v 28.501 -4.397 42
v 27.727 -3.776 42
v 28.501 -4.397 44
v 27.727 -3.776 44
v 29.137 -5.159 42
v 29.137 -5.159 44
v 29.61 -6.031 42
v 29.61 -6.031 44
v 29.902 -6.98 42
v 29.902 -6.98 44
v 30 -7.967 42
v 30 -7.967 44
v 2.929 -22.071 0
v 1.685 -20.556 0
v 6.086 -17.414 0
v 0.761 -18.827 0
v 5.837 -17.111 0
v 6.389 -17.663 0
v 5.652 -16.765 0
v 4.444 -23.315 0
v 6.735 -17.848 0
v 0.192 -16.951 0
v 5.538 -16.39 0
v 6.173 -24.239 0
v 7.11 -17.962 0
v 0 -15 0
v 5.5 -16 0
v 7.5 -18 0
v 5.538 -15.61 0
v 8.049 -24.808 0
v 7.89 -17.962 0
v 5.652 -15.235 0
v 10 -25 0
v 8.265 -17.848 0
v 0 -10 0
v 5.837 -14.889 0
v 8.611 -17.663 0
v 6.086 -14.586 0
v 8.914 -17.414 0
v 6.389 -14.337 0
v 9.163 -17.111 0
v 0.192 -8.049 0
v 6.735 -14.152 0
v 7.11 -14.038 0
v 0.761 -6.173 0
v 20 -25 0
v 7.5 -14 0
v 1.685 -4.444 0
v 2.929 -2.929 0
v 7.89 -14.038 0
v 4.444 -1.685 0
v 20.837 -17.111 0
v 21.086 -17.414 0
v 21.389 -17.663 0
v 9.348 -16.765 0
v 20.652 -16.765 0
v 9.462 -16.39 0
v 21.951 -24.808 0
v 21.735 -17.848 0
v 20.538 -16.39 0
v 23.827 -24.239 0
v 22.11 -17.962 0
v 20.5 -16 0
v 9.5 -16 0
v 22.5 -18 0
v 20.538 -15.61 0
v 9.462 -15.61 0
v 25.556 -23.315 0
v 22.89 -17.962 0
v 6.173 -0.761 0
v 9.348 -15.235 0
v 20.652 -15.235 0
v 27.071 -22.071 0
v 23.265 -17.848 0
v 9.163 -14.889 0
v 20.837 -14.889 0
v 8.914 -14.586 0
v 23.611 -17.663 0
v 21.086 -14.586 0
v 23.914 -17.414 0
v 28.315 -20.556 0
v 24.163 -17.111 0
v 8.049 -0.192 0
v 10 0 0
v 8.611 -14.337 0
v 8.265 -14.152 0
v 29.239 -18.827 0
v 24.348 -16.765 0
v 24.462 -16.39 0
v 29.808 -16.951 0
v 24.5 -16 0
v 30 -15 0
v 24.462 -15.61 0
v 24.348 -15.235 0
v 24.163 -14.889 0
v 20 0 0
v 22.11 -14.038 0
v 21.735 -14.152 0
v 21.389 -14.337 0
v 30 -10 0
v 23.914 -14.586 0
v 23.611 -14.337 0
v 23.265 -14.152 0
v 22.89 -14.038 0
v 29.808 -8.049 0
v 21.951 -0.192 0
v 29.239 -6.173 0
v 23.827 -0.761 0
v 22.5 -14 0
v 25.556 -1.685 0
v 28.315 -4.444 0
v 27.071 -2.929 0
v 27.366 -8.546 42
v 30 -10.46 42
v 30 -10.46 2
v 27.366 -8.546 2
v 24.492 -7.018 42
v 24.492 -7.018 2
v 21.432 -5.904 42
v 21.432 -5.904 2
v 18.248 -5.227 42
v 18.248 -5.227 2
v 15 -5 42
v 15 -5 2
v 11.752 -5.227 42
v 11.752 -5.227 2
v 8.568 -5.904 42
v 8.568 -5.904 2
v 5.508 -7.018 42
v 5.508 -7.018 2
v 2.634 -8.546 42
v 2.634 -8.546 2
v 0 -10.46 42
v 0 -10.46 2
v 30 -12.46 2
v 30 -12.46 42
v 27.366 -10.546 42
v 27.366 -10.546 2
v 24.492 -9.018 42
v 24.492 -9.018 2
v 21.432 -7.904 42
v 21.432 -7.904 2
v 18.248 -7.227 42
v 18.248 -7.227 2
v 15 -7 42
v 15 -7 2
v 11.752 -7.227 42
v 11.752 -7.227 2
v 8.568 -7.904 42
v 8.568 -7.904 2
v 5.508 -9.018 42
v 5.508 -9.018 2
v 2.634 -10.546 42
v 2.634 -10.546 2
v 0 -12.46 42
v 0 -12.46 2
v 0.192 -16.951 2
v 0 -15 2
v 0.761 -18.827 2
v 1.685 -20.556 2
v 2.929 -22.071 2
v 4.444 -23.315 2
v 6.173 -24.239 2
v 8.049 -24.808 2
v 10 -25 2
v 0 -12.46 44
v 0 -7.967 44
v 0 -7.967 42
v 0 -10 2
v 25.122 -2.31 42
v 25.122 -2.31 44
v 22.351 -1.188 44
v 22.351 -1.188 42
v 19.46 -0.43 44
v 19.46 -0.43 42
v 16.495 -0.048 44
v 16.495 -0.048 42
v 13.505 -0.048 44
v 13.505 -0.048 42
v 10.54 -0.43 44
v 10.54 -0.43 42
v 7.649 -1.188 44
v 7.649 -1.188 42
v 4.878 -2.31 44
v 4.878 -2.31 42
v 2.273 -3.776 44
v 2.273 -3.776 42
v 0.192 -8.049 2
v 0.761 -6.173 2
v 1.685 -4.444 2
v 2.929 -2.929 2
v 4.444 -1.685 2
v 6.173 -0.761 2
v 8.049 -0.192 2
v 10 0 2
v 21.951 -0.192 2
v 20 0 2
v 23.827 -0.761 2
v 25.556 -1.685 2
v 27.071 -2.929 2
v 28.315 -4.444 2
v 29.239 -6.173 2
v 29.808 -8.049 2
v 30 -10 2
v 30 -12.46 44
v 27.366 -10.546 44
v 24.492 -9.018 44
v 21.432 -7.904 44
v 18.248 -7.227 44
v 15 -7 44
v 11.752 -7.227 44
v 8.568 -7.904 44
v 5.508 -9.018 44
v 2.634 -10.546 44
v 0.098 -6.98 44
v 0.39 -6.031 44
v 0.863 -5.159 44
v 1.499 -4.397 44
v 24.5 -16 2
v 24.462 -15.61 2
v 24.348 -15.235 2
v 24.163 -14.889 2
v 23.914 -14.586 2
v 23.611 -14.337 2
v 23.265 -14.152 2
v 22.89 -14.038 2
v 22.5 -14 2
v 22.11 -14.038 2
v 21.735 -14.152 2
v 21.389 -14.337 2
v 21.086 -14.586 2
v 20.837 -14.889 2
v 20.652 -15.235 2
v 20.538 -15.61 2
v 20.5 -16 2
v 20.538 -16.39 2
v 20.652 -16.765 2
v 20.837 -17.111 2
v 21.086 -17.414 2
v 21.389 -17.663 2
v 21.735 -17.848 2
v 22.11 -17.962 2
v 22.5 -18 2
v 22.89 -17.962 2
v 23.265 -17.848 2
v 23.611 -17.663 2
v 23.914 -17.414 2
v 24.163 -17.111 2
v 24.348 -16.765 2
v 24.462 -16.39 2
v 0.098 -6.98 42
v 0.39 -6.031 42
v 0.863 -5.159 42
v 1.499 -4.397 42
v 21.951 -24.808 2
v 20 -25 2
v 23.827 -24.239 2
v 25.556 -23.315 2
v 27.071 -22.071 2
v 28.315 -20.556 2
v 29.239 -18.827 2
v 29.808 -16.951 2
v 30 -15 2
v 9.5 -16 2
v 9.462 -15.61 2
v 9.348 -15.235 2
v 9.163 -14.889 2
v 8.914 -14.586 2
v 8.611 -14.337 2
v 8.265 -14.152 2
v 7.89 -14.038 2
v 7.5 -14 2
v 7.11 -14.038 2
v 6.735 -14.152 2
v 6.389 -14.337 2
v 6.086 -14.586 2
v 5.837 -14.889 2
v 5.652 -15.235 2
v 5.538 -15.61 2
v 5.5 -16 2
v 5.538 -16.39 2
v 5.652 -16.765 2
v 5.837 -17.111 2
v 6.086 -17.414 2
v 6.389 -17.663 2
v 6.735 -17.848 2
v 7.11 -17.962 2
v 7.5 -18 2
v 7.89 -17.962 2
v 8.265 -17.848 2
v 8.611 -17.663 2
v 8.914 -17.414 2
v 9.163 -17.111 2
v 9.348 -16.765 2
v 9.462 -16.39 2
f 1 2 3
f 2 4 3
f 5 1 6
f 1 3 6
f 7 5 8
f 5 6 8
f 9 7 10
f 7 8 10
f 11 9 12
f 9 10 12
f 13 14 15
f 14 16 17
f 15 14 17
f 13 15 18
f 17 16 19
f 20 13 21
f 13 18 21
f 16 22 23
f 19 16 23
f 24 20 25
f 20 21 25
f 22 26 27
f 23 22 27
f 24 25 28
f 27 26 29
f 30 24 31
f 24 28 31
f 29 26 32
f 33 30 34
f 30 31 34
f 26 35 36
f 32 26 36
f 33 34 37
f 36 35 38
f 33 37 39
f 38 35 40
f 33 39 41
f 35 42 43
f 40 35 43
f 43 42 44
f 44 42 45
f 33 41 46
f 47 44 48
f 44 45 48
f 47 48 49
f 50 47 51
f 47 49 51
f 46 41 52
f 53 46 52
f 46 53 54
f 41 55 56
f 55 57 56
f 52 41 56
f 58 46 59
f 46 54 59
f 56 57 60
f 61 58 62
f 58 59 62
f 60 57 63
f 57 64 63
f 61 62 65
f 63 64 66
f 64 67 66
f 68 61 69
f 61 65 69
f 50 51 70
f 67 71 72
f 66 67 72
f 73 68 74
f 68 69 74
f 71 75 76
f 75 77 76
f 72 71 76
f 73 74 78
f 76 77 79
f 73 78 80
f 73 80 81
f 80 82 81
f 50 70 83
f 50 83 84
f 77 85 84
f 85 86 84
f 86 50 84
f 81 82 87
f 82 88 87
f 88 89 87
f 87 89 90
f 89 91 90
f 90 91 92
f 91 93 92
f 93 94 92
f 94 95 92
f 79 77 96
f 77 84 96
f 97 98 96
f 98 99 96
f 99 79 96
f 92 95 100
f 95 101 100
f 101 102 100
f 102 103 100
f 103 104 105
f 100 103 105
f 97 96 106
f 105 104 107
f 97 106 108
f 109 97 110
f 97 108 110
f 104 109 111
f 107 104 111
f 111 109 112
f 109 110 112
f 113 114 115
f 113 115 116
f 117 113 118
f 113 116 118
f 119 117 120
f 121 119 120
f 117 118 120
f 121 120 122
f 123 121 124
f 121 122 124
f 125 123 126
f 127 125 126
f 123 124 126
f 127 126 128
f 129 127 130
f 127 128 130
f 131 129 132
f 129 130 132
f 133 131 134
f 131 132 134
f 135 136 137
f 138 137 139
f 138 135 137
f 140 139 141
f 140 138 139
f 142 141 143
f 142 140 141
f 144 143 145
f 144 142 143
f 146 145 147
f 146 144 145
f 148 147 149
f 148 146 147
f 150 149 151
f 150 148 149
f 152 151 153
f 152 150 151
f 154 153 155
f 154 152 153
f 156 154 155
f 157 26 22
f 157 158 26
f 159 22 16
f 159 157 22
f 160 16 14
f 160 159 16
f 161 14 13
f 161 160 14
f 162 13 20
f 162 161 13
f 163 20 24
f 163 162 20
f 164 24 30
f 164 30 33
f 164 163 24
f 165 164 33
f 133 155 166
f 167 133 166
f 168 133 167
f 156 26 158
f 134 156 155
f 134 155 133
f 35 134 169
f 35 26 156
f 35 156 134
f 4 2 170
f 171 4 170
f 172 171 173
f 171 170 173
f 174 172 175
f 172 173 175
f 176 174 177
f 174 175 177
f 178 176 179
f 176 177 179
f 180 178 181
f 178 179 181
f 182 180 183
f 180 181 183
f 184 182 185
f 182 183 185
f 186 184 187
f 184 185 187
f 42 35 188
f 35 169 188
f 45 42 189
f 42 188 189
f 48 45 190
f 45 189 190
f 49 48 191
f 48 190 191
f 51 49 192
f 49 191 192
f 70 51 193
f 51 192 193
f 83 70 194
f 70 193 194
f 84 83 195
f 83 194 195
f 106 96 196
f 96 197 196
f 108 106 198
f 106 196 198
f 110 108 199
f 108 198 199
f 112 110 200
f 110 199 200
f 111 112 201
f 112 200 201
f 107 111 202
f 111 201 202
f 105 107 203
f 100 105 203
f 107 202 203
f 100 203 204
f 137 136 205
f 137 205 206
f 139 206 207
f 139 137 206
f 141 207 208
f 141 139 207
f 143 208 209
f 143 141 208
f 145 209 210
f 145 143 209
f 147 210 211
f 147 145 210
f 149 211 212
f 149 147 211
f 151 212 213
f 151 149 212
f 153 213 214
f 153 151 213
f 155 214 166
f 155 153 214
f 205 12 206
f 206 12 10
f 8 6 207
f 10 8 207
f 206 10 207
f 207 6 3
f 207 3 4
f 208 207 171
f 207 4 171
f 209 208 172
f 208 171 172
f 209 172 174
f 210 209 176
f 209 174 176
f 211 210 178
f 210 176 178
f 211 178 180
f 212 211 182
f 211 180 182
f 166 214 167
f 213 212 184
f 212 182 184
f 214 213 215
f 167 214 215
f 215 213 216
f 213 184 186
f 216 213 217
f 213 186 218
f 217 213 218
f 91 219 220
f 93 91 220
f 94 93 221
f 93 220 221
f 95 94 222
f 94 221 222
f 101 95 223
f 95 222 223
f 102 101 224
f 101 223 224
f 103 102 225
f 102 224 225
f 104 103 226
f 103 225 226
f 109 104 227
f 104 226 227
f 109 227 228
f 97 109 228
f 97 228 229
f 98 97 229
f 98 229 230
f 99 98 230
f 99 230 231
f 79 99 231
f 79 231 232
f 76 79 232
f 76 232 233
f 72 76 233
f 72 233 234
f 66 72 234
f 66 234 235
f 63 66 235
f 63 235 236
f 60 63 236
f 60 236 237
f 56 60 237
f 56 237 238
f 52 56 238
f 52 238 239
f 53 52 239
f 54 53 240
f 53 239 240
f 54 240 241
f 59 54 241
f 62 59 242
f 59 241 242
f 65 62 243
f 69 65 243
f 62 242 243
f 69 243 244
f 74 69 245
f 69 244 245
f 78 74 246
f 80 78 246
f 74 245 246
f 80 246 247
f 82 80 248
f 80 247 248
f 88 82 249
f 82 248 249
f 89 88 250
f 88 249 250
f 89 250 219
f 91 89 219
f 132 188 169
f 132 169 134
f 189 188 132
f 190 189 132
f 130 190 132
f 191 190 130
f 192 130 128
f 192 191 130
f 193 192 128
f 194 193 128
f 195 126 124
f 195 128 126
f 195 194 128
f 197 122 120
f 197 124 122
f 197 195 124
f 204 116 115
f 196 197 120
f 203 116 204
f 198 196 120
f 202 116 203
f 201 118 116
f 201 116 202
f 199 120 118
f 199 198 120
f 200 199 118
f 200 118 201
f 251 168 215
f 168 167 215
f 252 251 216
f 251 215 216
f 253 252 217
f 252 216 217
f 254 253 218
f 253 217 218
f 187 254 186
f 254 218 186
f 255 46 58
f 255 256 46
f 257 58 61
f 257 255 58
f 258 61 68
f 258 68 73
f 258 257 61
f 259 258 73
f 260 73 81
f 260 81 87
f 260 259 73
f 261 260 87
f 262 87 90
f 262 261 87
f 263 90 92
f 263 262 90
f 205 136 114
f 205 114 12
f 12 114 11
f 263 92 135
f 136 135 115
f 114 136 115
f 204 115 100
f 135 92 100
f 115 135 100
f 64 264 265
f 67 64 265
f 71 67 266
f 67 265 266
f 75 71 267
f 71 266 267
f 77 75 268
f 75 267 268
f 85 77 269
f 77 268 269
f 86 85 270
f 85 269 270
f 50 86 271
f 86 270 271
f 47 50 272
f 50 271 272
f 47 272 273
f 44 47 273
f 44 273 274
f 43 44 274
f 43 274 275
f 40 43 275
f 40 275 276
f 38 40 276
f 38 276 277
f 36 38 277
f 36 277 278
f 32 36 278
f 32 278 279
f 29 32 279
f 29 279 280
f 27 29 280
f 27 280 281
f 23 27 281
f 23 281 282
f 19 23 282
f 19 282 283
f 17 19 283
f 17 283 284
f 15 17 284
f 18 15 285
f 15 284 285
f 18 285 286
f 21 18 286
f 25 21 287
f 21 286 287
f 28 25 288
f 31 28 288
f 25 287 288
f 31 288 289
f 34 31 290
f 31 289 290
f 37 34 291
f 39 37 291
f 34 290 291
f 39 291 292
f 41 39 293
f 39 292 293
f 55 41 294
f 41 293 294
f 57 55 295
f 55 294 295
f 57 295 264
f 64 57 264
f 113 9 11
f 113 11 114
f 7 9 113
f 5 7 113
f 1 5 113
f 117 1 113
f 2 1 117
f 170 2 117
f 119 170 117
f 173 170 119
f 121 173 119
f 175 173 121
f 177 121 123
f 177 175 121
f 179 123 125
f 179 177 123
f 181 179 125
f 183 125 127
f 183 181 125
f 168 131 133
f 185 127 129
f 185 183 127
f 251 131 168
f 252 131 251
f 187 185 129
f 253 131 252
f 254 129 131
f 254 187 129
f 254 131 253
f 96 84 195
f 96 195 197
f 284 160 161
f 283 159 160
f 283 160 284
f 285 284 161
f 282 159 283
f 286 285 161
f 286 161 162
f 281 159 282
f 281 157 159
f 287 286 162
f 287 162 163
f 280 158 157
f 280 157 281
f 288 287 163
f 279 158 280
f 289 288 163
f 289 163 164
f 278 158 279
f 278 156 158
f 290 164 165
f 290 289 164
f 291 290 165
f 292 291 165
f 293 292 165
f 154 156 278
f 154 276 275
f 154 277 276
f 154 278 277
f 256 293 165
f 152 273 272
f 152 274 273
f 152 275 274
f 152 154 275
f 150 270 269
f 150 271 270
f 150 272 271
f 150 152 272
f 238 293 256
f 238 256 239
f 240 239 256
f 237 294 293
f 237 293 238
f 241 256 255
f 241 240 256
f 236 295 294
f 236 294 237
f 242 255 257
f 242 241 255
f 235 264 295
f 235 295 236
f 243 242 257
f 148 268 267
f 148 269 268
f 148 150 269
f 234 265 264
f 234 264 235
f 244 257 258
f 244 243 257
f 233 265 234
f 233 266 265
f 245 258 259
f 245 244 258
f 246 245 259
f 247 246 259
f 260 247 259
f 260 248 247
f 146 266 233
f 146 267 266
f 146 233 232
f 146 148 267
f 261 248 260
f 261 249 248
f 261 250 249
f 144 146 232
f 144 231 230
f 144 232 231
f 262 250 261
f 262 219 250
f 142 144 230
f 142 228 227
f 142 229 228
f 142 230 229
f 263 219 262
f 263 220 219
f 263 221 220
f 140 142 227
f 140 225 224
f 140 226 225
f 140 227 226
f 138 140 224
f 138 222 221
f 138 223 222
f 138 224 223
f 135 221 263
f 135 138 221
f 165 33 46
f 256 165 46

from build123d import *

# Parameters (mm, degrees)
SKETCH_W     = 30
SKETCH_H     = 25
PAD_DEPTH    = 2
FILLET_R     = 10
FILLET001_R  = 10
PAD001_DEPTH = 40
FILLET002_R  = 10
FILLET003_R  = 10
PAD002_DEPTH = 2
FILLET004_R  = 5
FILLET005_R  = 5
SKETCH003_R  = 2
POCKET_DEPTH = 5


with BuildPart() as part:
    # Sketch → Pad (new body)
    with BuildSketch(Plane.XY):
        with Locations((15, -12.5)):
            Rectangle(SKETCH_W, SKETCH_H)
    extrude(amount=PAD_DEPTH)

    # Fillet
    fillet_edges = [part.edges().sort_by_distance(p)[0] for p in [
        (0, -25, 1),
    ]]
    fillet(fillet_edges, radius=FILLET_R)

    # Fillet001
    fillet001_edges = [part.edges().sort_by_distance(p)[0] for p in [
        (30, -25, 1),
    ]]
    fillet(fillet001_edges, radius=FILLET001_R)

    # Sketch001 (on Face5 of Fillet001) → Pad001 (join)
    with BuildSketch(Plane.XY.offset(2)):
        with BuildLine():
            ThreePointArc((30, -10.46031), (15, -5), (0, -10.46031))
            Line((0, -12.46031), (0, -10.46031))
            ThreePointArc((30, -12.46031), (15, -7), (0, -12.46031))
            Line((30, -12.46031), (30, -10.46031))
        make_face()
    extrude(amount=PAD001_DEPTH)

    # Fillet002
    fillet002_edges = [part.edges().sort_by_distance(p)[0] for p in [
        (0, 0, 1),
    ]]
    fillet(fillet002_edges, radius=FILLET002_R)

    # Fillet003
    fillet003_edges = [part.edges().sort_by_distance(p)[0] for p in [
        (30, 0, 1),
    ]]
    fillet(fillet003_edges, radius=FILLET003_R)

    # Sketch002 (on Face16 of Fillet003) → Pad002 (join)
    with BuildSketch(Plane.XY.offset(42)):
        with BuildLine():
            ThreePointArc((30, -12.459868), (15, -7), (0, -12.459868))
            Line((0, -12.459868), (0, -5.459868))
            ThreePointArc((30, -5.459868), (15, 0), (0, -5.459868))
            Line((30, -12.459868), (30, -5.459868))
        make_face()
    extrude(amount=PAD002_DEPTH)

    # Fillet004
    fillet004_edges = [part.edges().sort_by_distance(p)[0] for p in [
        (0, -5.459868, 43),
    ]]
    fillet(fillet004_edges, radius=FILLET004_R)

    # Fillet005
    fillet005_edges = [part.edges().sort_by_distance(p)[0] for p in [
        (30, -5.459868, 43),
    ]]
    fillet(fillet005_edges, radius=FILLET005_R)

    # Sketch003 (on Face21 of Fillet005) → Pocket (cut)
    with BuildSketch(Plane.XY.offset(2)):
        with Locations((7.5, -16)):
            Circle(SKETCH003_R)
        with Locations((22.5, -16)):
            Circle(SKETCH003_R)
    extrude(amount=-POCKET_DEPTH, mode=Mode.SUBTRACT)


solid = part.part
